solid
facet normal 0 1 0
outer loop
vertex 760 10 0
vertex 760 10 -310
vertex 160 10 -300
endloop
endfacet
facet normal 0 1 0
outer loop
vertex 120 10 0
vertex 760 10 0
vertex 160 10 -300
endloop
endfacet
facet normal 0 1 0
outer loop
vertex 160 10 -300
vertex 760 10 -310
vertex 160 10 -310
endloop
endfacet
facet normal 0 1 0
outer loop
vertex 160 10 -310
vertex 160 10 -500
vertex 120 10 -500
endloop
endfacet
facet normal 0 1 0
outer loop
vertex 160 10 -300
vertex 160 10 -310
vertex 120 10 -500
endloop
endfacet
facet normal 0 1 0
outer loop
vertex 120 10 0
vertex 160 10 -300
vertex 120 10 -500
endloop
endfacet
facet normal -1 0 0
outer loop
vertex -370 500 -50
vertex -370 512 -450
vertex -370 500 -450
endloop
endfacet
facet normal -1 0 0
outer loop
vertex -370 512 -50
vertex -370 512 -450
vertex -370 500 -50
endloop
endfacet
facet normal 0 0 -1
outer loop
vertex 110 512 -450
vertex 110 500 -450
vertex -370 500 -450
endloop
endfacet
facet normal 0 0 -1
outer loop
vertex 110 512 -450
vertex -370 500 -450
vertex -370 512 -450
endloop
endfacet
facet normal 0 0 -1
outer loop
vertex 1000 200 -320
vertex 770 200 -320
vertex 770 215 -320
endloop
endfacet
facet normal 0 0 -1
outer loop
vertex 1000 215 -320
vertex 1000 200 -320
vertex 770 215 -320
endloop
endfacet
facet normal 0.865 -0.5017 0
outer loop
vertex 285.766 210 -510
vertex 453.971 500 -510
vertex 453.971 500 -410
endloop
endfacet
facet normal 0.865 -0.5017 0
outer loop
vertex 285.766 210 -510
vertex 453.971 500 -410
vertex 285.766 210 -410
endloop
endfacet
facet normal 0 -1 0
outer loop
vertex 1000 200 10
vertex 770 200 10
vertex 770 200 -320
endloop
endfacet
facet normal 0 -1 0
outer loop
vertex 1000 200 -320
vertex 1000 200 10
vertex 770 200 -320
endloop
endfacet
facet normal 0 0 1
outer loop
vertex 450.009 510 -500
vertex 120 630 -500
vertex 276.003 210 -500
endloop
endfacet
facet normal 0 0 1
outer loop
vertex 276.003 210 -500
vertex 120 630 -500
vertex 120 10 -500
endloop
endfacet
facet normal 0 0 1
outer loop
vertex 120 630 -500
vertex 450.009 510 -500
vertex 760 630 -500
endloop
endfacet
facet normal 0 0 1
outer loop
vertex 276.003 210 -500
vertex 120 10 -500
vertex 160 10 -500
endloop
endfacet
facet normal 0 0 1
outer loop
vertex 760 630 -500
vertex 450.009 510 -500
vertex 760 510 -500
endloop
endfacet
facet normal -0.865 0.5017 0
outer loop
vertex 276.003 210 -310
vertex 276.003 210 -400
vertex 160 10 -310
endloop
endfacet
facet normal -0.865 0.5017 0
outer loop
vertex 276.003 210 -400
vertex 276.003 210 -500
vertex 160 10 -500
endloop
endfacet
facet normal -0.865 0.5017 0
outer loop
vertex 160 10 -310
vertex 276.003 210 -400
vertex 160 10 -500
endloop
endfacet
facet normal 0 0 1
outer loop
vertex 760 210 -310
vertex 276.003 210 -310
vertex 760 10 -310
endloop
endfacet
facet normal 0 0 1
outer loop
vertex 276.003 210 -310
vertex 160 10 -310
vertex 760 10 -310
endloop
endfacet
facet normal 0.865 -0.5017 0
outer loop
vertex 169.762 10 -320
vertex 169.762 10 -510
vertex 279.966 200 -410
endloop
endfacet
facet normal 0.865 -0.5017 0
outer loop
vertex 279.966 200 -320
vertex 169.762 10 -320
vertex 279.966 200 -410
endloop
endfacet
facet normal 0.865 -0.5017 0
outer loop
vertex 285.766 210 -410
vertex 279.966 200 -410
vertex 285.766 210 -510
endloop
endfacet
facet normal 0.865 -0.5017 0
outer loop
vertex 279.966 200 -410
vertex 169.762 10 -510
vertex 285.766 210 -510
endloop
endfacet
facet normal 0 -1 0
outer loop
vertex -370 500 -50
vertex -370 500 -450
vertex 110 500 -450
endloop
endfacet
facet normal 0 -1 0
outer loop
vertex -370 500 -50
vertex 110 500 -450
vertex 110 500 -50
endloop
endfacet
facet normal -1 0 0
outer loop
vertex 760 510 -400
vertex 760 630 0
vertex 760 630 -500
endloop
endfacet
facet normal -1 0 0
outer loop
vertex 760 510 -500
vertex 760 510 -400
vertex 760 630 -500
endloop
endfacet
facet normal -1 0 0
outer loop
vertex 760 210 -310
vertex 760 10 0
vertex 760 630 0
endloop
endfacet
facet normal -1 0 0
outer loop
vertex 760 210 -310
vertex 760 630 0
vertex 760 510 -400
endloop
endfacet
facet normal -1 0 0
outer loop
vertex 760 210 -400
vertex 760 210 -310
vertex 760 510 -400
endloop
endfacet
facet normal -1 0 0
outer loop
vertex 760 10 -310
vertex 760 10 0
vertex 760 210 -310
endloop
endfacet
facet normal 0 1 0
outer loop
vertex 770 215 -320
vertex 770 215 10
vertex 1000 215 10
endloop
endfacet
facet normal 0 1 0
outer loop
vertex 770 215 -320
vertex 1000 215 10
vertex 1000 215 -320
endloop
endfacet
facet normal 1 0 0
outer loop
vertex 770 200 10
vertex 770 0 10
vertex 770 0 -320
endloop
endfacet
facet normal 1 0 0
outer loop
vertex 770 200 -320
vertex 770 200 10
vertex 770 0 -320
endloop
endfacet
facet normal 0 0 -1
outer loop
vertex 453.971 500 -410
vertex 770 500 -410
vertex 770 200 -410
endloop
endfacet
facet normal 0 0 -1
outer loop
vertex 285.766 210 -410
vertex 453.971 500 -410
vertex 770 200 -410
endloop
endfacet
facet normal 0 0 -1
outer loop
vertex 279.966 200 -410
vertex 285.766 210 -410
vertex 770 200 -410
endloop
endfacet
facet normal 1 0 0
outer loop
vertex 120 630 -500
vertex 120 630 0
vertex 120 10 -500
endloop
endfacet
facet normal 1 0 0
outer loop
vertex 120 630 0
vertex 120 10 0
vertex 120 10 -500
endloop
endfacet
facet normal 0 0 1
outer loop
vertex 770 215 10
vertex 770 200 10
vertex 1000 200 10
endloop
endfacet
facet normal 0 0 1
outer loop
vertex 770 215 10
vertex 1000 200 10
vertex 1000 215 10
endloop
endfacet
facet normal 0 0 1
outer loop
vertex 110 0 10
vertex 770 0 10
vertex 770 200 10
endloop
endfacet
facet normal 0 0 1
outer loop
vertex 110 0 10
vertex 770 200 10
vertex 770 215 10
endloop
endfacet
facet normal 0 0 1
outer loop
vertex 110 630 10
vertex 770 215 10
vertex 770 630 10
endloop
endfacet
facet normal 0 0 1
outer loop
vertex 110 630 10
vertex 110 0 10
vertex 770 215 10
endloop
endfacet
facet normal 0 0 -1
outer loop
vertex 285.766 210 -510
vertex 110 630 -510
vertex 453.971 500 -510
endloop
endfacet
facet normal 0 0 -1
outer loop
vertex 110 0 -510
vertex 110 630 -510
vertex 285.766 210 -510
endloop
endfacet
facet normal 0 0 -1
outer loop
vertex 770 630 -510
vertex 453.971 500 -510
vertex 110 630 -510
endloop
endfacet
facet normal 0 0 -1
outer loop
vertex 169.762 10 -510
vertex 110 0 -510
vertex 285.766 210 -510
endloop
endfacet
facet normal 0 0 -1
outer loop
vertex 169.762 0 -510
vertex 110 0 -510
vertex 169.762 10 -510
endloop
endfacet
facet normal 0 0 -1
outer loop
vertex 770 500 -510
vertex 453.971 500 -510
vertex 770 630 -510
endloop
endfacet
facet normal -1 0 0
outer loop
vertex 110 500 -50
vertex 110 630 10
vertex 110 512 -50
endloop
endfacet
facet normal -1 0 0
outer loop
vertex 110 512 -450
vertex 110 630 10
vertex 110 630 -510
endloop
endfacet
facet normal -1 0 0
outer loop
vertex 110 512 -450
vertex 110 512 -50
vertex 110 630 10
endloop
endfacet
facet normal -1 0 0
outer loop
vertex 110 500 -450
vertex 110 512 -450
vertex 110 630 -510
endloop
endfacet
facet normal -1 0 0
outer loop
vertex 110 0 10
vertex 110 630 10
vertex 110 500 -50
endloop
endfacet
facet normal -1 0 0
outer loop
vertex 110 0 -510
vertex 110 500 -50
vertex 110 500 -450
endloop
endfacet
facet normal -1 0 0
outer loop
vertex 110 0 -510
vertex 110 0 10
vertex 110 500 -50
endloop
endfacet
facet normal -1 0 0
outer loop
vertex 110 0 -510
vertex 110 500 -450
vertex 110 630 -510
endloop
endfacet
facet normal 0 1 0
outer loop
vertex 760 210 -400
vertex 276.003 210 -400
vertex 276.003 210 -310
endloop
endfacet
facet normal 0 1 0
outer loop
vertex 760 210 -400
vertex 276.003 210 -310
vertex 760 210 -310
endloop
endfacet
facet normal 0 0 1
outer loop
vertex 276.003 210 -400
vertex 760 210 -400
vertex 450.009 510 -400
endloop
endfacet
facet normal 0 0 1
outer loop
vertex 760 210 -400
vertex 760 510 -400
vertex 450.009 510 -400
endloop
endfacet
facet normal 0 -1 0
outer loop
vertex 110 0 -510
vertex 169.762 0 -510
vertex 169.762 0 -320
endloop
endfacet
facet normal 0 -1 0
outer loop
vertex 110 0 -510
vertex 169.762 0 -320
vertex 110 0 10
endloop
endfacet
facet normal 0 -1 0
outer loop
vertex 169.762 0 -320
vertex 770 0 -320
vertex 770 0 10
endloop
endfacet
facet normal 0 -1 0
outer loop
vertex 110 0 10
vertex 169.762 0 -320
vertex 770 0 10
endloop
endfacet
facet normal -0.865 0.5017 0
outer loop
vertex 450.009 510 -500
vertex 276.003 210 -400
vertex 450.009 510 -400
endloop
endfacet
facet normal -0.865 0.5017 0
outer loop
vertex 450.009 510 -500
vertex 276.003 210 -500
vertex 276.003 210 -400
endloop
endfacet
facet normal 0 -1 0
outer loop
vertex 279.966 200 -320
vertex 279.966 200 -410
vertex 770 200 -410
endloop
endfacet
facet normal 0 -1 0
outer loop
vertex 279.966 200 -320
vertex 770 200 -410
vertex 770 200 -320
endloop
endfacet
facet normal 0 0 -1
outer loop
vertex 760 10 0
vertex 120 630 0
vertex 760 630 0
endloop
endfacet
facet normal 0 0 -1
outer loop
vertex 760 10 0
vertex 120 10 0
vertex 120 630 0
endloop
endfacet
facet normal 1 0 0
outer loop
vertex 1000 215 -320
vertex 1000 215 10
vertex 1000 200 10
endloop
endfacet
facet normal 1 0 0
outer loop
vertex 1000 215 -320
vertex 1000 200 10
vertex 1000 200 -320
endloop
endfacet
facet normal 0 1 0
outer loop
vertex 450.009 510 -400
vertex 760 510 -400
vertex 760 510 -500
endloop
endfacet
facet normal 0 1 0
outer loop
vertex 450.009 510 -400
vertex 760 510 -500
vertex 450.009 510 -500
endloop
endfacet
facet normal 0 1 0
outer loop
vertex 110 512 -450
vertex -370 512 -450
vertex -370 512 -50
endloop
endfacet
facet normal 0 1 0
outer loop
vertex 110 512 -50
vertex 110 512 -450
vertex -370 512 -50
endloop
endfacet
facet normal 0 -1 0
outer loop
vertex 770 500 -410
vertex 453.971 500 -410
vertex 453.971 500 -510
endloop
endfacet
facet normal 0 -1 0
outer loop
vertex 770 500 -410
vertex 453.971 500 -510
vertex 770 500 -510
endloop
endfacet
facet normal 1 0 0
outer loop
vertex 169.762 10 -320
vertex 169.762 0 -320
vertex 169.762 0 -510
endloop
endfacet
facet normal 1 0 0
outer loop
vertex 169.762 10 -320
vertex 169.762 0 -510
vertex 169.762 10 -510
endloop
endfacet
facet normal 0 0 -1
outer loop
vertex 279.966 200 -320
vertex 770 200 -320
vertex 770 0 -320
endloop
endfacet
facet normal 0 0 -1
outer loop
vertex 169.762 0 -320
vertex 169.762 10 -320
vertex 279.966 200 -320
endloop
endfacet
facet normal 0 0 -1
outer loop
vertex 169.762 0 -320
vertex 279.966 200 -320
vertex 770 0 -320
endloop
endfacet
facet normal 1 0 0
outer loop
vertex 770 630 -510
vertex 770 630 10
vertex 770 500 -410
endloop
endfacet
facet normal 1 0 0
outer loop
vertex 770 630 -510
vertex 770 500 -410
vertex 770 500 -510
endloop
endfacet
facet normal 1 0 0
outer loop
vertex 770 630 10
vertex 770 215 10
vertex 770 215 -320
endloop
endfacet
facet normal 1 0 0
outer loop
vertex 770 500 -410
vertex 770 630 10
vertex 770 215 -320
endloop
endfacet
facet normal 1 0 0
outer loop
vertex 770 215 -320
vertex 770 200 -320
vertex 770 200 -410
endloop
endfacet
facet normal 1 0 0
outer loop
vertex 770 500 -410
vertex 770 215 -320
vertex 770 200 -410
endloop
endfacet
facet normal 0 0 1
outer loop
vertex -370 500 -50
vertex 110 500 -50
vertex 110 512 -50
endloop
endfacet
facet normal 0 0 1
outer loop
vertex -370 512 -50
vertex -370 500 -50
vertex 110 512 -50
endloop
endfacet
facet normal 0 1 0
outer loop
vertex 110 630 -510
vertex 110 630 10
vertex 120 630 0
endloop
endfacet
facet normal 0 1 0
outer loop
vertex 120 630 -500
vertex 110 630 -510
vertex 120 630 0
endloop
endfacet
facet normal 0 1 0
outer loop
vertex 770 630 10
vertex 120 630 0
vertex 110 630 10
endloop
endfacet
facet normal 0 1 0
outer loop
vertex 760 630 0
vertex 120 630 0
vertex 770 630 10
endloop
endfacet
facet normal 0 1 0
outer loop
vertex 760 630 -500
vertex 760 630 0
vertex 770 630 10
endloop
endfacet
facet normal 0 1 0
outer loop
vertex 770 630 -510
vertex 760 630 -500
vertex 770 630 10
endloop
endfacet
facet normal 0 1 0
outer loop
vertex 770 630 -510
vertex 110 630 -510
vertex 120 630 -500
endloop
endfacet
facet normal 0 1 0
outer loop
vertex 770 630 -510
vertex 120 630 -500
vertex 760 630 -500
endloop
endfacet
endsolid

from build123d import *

# Parameters (mm, degrees)
EXTRUDE_1_DEPTH     = 10
SKETCH_2_W          = 10
SKETCH_2_H          = 510
EXTRUDE_2_DEPTH     = 500
EXTRUDE_3_DEPTH     = 10
EXTRUDE_4_DEPTH     = 190
SKETCH_5_W          = 640
SKETCH_5_H          = 10
EXTRUDE_5_DEPTH     = 200
CUT_EXTRUDE_1_DEPTH = 20
SKETCH_7_W          = 523.996532841
SKETCH_7_H          = 100
EXTRUDE_7_DEPTH     = 10
EXTRUDE_8_DEPTH     = 100
EXTRUDE_9_DEPTH     = 10
EXTRUDE_10_DEPTH    = 10
SKETCH_11_W         = 810
SKETCH_11_H         = 510
EXTRUDE_11_DEPTH    = 10
SKETCH_12_W         = 520
SKETCH_12_H         = 510
CUT_EXTRUDE_2_DEPTH = 120
SKETCH_13_W         = 520
SKETCH_13_H         = 510
CUT_EXTRUDE_3_DEPTH = 50
EXTRUDE_12_DEPTH    = 10
SKETCH_15_W         = 520
SKETCH_15_H         = 510
EXTRUDE_13_DEPTH    = 10
EXTRUDE_15_DEPTH    = 100
SKETCH_18_W         = 660
SKETCH_18_H         = 520
SKETCH_18_W_2       = 640
SKETCH_18_H_2       = 500
EXTRUDE_16_DEPTH    = 120
SKETCH_19_W         = 400
SKETCH_19_H         = 12
EXTRUDE_17_DEPTH    = 480
SKETCH_20_W         = 330
SKETCH_20_H         = 15
EXTRUDE_18_DEPTH    = 230


with BuildPart() as part:
    # 草图1 → 凸台-拉伸1 (new body)
    with BuildSketch(Plane(origin=(0, 0, 0), x_dir=(1, 0, 0), z_dir=(0, 1, 0))):
        Polygon((0, 300), (0, 510), (160, 510), (160, 320), (800, 320), (800, 0), (0, 0), align=None)
    extrude(amount=EXTRUDE_1_DEPTH)

    # 草图2 → 凸台-拉伸2 (add)
    with BuildSketch(Plane(origin=(0, 10, 0), x_dir=(1, 0, 0), z_dir=(0, 1, 0))):
        with Locations((5, 255)):
            Rectangle(SKETCH_2_W, SKETCH_2_H)
    extrude(amount=EXTRUDE_2_DEPTH)

    # 草图3 → 凸台-拉伸3 (add)
    with BuildSketch(Plane(origin=(0, 0, -510), x_dir=(-1, 0, 0), z_dir=(0, 0, -1))):
        Polygon((-10, 510), (-10, 10), (-160, 10), (-450.008667897, 510), align=None)
    extrude(amount=-EXTRUDE_3_DEPTH)

    # 草图4 → 凸台-拉伸4 (add)
    with BuildSketch(Plane(origin=(0, 0, -510), x_dir=(-1, 0, 0), z_dir=(0, 0, -1))):
        Polygon((-276.003467159, 210), (-160, 10), (-160, 0), (-169.762228515, 0), (-169.762228515, 10), (-285.765695674, 210), align=None)
    extrude(amount=-EXTRUDE_4_DEPTH)

    # 草图5 → 凸台-拉伸5 (add)
    with BuildSketch(Plane(origin=(0, 10, 0), x_dir=(1, 0, 0), z_dir=(0, 1, 0))):
        with Locations((480, 315)):
            Rectangle(SKETCH_5_W, SKETCH_5_H)
    extrude(amount=EXTRUDE_5_DEPTH)

    # 草图6 → 切除-拉伸1 (cut)
    with BuildSketch(Plane(origin=(0, 0, -320), x_dir=(-1, 0, 0), z_dir=(0, 0, -1))):
        Polygon((-160, 210), (-276.003467159, 210), (-160, 10), align=None)
    extrude(amount=-CUT_EXTRUDE_1_DEPTH, mode=Mode.SUBTRACT)

    # 草图7 → 凸台-拉伸7 (add)
    with BuildSketch(Plane(origin=(0, 210, 0), x_dir=(1, 0, 0), z_dir=(0, 1, 0))):
        with Locations((538.00173358, 360)):
            Rectangle(SKETCH_7_W, SKETCH_7_H)
    extrude(amount=-EXTRUDE_7_DEPTH)

    # 草图8 → 凸台-拉伸8 (add)
    with BuildSketch(Plane(origin=(0, 0, -510), x_dir=(-1, 0, 0), z_dir=(0, 0, -1))):
        Polygon((-276.003467159, 210), (-450.008667897, 510), (-459.770896412, 510), (-285.765695674, 210), align=None)
    extrude(amount=-EXTRUDE_8_DEPTH)

    # 草图9 → 凸台-拉伸9 (add)
    with BuildSketch(Plane.XY.offset(-410)):
        Polygon((276.003467159, 210), (450.008667897, 510), (800, 510), (800, 210), align=None)
    extrude(amount=EXTRUDE_9_DEPTH)

    # 草图10 → 凸台-拉伸10 (add)
    with BuildSketch(Plane(origin=(800, 0, 0), x_dir=(0, 0, -1), z_dir=(1, 0, 0))):
        Polygon((0, 0), (320, 0), (320, 200), (410, 200), (410, 510), (0, 510), align=None)
    extrude(amount=EXTRUDE_10_DEPTH)

    # 草图11 → 凸台-拉伸11 (add)
    with BuildSketch(Plane.XY):
        with Locations((405, 255)):
            Rectangle(SKETCH_11_W, SKETCH_11_H)
    extrude(amount=EXTRUDE_11_DEPTH)

    # 草图12 → 切除-拉伸2 (cut)
    with BuildSketch(Plane.ZY):
        with Locations((-250, 255)):
            Rectangle(SKETCH_12_W, SKETCH_12_H)
    extrude(amount=-CUT_EXTRUDE_2_DEPTH, mode=Mode.SUBTRACT)

    # 草图13 → 切除-拉伸3 (cut)
    with BuildSketch(Plane(origin=(810, 0, 0), x_dir=(0, 0, -1), z_dir=(1, 0, 0))):
        with Locations((250, 255)):
            Rectangle(SKETCH_13_W, SKETCH_13_H)
    extrude(amount=-CUT_EXTRUDE_3_DEPTH, mode=Mode.SUBTRACT)

    # 草图14 → 凸台-拉伸12 (add)
    with BuildSketch(Plane(origin=(760, 0, 0), x_dir=(0, 0, -1), z_dir=(1, 0, 0))):
        Polygon((-10, 510), (320, 510), (410, 510), (410, 200), (320, 200), (320, 0), (-10, 0), align=None)
    extrude(amount=EXTRUDE_12_DEPTH)

    # 草图15 → 凸台-拉伸13 (add)
    with BuildSketch(Plane.ZY.offset(-120)):
        with Locations((-250, 255)):
            Rectangle(SKETCH_15_W, SKETCH_15_H)
    extrude(amount=EXTRUDE_13_DEPTH)

    # 草图17 → 凸台-拉伸15 (add)
    with BuildSketch(Plane(origin=(0, 0, -410), x_dir=(-1, 0, 0), z_dir=(0, 0, -1))):
        Polygon((-770, 510), (-459.770896412, 510), (-453.970723054, 500), (-770, 500), align=None)
    extrude(amount=EXTRUDE_15_DEPTH)

    # 草图18 → 凸台-拉伸16 (add)
    with BuildSketch(Plane(origin=(0, 510, 0), x_dir=(1, 0, 0), z_dir=(0, 1, 0))):
        with Locations((440, 250)):
            Rectangle(SKETCH_18_W, SKETCH_18_H)
        with Locations((440, 250)):
            Rectangle(SKETCH_18_W_2, SKETCH_18_H_2, mode=Mode.SUBTRACT)
    extrude(amount=EXTRUDE_16_DEPTH)

    # 草图19 → 凸台-拉伸17 (add)
    with BuildSketch(Plane.ZY.offset(-110)):
        with Locations((-250, 506)):
            Rectangle(SKETCH_19_W, SKETCH_19_H)
    extrude(amount=EXTRUDE_17_DEPTH)

    # 草图20 → 凸台-拉伸18 (add)
    with BuildSketch(Plane(origin=(770, 0, 0), x_dir=(0, 0, -1), z_dir=(1, 0, 0))):
        with Locations((155, 207.5)):
            Rectangle(SKETCH_20_W, SKETCH_20_H)
    extrude(amount=EXTRUDE_18_DEPTH)


solid = part.part
